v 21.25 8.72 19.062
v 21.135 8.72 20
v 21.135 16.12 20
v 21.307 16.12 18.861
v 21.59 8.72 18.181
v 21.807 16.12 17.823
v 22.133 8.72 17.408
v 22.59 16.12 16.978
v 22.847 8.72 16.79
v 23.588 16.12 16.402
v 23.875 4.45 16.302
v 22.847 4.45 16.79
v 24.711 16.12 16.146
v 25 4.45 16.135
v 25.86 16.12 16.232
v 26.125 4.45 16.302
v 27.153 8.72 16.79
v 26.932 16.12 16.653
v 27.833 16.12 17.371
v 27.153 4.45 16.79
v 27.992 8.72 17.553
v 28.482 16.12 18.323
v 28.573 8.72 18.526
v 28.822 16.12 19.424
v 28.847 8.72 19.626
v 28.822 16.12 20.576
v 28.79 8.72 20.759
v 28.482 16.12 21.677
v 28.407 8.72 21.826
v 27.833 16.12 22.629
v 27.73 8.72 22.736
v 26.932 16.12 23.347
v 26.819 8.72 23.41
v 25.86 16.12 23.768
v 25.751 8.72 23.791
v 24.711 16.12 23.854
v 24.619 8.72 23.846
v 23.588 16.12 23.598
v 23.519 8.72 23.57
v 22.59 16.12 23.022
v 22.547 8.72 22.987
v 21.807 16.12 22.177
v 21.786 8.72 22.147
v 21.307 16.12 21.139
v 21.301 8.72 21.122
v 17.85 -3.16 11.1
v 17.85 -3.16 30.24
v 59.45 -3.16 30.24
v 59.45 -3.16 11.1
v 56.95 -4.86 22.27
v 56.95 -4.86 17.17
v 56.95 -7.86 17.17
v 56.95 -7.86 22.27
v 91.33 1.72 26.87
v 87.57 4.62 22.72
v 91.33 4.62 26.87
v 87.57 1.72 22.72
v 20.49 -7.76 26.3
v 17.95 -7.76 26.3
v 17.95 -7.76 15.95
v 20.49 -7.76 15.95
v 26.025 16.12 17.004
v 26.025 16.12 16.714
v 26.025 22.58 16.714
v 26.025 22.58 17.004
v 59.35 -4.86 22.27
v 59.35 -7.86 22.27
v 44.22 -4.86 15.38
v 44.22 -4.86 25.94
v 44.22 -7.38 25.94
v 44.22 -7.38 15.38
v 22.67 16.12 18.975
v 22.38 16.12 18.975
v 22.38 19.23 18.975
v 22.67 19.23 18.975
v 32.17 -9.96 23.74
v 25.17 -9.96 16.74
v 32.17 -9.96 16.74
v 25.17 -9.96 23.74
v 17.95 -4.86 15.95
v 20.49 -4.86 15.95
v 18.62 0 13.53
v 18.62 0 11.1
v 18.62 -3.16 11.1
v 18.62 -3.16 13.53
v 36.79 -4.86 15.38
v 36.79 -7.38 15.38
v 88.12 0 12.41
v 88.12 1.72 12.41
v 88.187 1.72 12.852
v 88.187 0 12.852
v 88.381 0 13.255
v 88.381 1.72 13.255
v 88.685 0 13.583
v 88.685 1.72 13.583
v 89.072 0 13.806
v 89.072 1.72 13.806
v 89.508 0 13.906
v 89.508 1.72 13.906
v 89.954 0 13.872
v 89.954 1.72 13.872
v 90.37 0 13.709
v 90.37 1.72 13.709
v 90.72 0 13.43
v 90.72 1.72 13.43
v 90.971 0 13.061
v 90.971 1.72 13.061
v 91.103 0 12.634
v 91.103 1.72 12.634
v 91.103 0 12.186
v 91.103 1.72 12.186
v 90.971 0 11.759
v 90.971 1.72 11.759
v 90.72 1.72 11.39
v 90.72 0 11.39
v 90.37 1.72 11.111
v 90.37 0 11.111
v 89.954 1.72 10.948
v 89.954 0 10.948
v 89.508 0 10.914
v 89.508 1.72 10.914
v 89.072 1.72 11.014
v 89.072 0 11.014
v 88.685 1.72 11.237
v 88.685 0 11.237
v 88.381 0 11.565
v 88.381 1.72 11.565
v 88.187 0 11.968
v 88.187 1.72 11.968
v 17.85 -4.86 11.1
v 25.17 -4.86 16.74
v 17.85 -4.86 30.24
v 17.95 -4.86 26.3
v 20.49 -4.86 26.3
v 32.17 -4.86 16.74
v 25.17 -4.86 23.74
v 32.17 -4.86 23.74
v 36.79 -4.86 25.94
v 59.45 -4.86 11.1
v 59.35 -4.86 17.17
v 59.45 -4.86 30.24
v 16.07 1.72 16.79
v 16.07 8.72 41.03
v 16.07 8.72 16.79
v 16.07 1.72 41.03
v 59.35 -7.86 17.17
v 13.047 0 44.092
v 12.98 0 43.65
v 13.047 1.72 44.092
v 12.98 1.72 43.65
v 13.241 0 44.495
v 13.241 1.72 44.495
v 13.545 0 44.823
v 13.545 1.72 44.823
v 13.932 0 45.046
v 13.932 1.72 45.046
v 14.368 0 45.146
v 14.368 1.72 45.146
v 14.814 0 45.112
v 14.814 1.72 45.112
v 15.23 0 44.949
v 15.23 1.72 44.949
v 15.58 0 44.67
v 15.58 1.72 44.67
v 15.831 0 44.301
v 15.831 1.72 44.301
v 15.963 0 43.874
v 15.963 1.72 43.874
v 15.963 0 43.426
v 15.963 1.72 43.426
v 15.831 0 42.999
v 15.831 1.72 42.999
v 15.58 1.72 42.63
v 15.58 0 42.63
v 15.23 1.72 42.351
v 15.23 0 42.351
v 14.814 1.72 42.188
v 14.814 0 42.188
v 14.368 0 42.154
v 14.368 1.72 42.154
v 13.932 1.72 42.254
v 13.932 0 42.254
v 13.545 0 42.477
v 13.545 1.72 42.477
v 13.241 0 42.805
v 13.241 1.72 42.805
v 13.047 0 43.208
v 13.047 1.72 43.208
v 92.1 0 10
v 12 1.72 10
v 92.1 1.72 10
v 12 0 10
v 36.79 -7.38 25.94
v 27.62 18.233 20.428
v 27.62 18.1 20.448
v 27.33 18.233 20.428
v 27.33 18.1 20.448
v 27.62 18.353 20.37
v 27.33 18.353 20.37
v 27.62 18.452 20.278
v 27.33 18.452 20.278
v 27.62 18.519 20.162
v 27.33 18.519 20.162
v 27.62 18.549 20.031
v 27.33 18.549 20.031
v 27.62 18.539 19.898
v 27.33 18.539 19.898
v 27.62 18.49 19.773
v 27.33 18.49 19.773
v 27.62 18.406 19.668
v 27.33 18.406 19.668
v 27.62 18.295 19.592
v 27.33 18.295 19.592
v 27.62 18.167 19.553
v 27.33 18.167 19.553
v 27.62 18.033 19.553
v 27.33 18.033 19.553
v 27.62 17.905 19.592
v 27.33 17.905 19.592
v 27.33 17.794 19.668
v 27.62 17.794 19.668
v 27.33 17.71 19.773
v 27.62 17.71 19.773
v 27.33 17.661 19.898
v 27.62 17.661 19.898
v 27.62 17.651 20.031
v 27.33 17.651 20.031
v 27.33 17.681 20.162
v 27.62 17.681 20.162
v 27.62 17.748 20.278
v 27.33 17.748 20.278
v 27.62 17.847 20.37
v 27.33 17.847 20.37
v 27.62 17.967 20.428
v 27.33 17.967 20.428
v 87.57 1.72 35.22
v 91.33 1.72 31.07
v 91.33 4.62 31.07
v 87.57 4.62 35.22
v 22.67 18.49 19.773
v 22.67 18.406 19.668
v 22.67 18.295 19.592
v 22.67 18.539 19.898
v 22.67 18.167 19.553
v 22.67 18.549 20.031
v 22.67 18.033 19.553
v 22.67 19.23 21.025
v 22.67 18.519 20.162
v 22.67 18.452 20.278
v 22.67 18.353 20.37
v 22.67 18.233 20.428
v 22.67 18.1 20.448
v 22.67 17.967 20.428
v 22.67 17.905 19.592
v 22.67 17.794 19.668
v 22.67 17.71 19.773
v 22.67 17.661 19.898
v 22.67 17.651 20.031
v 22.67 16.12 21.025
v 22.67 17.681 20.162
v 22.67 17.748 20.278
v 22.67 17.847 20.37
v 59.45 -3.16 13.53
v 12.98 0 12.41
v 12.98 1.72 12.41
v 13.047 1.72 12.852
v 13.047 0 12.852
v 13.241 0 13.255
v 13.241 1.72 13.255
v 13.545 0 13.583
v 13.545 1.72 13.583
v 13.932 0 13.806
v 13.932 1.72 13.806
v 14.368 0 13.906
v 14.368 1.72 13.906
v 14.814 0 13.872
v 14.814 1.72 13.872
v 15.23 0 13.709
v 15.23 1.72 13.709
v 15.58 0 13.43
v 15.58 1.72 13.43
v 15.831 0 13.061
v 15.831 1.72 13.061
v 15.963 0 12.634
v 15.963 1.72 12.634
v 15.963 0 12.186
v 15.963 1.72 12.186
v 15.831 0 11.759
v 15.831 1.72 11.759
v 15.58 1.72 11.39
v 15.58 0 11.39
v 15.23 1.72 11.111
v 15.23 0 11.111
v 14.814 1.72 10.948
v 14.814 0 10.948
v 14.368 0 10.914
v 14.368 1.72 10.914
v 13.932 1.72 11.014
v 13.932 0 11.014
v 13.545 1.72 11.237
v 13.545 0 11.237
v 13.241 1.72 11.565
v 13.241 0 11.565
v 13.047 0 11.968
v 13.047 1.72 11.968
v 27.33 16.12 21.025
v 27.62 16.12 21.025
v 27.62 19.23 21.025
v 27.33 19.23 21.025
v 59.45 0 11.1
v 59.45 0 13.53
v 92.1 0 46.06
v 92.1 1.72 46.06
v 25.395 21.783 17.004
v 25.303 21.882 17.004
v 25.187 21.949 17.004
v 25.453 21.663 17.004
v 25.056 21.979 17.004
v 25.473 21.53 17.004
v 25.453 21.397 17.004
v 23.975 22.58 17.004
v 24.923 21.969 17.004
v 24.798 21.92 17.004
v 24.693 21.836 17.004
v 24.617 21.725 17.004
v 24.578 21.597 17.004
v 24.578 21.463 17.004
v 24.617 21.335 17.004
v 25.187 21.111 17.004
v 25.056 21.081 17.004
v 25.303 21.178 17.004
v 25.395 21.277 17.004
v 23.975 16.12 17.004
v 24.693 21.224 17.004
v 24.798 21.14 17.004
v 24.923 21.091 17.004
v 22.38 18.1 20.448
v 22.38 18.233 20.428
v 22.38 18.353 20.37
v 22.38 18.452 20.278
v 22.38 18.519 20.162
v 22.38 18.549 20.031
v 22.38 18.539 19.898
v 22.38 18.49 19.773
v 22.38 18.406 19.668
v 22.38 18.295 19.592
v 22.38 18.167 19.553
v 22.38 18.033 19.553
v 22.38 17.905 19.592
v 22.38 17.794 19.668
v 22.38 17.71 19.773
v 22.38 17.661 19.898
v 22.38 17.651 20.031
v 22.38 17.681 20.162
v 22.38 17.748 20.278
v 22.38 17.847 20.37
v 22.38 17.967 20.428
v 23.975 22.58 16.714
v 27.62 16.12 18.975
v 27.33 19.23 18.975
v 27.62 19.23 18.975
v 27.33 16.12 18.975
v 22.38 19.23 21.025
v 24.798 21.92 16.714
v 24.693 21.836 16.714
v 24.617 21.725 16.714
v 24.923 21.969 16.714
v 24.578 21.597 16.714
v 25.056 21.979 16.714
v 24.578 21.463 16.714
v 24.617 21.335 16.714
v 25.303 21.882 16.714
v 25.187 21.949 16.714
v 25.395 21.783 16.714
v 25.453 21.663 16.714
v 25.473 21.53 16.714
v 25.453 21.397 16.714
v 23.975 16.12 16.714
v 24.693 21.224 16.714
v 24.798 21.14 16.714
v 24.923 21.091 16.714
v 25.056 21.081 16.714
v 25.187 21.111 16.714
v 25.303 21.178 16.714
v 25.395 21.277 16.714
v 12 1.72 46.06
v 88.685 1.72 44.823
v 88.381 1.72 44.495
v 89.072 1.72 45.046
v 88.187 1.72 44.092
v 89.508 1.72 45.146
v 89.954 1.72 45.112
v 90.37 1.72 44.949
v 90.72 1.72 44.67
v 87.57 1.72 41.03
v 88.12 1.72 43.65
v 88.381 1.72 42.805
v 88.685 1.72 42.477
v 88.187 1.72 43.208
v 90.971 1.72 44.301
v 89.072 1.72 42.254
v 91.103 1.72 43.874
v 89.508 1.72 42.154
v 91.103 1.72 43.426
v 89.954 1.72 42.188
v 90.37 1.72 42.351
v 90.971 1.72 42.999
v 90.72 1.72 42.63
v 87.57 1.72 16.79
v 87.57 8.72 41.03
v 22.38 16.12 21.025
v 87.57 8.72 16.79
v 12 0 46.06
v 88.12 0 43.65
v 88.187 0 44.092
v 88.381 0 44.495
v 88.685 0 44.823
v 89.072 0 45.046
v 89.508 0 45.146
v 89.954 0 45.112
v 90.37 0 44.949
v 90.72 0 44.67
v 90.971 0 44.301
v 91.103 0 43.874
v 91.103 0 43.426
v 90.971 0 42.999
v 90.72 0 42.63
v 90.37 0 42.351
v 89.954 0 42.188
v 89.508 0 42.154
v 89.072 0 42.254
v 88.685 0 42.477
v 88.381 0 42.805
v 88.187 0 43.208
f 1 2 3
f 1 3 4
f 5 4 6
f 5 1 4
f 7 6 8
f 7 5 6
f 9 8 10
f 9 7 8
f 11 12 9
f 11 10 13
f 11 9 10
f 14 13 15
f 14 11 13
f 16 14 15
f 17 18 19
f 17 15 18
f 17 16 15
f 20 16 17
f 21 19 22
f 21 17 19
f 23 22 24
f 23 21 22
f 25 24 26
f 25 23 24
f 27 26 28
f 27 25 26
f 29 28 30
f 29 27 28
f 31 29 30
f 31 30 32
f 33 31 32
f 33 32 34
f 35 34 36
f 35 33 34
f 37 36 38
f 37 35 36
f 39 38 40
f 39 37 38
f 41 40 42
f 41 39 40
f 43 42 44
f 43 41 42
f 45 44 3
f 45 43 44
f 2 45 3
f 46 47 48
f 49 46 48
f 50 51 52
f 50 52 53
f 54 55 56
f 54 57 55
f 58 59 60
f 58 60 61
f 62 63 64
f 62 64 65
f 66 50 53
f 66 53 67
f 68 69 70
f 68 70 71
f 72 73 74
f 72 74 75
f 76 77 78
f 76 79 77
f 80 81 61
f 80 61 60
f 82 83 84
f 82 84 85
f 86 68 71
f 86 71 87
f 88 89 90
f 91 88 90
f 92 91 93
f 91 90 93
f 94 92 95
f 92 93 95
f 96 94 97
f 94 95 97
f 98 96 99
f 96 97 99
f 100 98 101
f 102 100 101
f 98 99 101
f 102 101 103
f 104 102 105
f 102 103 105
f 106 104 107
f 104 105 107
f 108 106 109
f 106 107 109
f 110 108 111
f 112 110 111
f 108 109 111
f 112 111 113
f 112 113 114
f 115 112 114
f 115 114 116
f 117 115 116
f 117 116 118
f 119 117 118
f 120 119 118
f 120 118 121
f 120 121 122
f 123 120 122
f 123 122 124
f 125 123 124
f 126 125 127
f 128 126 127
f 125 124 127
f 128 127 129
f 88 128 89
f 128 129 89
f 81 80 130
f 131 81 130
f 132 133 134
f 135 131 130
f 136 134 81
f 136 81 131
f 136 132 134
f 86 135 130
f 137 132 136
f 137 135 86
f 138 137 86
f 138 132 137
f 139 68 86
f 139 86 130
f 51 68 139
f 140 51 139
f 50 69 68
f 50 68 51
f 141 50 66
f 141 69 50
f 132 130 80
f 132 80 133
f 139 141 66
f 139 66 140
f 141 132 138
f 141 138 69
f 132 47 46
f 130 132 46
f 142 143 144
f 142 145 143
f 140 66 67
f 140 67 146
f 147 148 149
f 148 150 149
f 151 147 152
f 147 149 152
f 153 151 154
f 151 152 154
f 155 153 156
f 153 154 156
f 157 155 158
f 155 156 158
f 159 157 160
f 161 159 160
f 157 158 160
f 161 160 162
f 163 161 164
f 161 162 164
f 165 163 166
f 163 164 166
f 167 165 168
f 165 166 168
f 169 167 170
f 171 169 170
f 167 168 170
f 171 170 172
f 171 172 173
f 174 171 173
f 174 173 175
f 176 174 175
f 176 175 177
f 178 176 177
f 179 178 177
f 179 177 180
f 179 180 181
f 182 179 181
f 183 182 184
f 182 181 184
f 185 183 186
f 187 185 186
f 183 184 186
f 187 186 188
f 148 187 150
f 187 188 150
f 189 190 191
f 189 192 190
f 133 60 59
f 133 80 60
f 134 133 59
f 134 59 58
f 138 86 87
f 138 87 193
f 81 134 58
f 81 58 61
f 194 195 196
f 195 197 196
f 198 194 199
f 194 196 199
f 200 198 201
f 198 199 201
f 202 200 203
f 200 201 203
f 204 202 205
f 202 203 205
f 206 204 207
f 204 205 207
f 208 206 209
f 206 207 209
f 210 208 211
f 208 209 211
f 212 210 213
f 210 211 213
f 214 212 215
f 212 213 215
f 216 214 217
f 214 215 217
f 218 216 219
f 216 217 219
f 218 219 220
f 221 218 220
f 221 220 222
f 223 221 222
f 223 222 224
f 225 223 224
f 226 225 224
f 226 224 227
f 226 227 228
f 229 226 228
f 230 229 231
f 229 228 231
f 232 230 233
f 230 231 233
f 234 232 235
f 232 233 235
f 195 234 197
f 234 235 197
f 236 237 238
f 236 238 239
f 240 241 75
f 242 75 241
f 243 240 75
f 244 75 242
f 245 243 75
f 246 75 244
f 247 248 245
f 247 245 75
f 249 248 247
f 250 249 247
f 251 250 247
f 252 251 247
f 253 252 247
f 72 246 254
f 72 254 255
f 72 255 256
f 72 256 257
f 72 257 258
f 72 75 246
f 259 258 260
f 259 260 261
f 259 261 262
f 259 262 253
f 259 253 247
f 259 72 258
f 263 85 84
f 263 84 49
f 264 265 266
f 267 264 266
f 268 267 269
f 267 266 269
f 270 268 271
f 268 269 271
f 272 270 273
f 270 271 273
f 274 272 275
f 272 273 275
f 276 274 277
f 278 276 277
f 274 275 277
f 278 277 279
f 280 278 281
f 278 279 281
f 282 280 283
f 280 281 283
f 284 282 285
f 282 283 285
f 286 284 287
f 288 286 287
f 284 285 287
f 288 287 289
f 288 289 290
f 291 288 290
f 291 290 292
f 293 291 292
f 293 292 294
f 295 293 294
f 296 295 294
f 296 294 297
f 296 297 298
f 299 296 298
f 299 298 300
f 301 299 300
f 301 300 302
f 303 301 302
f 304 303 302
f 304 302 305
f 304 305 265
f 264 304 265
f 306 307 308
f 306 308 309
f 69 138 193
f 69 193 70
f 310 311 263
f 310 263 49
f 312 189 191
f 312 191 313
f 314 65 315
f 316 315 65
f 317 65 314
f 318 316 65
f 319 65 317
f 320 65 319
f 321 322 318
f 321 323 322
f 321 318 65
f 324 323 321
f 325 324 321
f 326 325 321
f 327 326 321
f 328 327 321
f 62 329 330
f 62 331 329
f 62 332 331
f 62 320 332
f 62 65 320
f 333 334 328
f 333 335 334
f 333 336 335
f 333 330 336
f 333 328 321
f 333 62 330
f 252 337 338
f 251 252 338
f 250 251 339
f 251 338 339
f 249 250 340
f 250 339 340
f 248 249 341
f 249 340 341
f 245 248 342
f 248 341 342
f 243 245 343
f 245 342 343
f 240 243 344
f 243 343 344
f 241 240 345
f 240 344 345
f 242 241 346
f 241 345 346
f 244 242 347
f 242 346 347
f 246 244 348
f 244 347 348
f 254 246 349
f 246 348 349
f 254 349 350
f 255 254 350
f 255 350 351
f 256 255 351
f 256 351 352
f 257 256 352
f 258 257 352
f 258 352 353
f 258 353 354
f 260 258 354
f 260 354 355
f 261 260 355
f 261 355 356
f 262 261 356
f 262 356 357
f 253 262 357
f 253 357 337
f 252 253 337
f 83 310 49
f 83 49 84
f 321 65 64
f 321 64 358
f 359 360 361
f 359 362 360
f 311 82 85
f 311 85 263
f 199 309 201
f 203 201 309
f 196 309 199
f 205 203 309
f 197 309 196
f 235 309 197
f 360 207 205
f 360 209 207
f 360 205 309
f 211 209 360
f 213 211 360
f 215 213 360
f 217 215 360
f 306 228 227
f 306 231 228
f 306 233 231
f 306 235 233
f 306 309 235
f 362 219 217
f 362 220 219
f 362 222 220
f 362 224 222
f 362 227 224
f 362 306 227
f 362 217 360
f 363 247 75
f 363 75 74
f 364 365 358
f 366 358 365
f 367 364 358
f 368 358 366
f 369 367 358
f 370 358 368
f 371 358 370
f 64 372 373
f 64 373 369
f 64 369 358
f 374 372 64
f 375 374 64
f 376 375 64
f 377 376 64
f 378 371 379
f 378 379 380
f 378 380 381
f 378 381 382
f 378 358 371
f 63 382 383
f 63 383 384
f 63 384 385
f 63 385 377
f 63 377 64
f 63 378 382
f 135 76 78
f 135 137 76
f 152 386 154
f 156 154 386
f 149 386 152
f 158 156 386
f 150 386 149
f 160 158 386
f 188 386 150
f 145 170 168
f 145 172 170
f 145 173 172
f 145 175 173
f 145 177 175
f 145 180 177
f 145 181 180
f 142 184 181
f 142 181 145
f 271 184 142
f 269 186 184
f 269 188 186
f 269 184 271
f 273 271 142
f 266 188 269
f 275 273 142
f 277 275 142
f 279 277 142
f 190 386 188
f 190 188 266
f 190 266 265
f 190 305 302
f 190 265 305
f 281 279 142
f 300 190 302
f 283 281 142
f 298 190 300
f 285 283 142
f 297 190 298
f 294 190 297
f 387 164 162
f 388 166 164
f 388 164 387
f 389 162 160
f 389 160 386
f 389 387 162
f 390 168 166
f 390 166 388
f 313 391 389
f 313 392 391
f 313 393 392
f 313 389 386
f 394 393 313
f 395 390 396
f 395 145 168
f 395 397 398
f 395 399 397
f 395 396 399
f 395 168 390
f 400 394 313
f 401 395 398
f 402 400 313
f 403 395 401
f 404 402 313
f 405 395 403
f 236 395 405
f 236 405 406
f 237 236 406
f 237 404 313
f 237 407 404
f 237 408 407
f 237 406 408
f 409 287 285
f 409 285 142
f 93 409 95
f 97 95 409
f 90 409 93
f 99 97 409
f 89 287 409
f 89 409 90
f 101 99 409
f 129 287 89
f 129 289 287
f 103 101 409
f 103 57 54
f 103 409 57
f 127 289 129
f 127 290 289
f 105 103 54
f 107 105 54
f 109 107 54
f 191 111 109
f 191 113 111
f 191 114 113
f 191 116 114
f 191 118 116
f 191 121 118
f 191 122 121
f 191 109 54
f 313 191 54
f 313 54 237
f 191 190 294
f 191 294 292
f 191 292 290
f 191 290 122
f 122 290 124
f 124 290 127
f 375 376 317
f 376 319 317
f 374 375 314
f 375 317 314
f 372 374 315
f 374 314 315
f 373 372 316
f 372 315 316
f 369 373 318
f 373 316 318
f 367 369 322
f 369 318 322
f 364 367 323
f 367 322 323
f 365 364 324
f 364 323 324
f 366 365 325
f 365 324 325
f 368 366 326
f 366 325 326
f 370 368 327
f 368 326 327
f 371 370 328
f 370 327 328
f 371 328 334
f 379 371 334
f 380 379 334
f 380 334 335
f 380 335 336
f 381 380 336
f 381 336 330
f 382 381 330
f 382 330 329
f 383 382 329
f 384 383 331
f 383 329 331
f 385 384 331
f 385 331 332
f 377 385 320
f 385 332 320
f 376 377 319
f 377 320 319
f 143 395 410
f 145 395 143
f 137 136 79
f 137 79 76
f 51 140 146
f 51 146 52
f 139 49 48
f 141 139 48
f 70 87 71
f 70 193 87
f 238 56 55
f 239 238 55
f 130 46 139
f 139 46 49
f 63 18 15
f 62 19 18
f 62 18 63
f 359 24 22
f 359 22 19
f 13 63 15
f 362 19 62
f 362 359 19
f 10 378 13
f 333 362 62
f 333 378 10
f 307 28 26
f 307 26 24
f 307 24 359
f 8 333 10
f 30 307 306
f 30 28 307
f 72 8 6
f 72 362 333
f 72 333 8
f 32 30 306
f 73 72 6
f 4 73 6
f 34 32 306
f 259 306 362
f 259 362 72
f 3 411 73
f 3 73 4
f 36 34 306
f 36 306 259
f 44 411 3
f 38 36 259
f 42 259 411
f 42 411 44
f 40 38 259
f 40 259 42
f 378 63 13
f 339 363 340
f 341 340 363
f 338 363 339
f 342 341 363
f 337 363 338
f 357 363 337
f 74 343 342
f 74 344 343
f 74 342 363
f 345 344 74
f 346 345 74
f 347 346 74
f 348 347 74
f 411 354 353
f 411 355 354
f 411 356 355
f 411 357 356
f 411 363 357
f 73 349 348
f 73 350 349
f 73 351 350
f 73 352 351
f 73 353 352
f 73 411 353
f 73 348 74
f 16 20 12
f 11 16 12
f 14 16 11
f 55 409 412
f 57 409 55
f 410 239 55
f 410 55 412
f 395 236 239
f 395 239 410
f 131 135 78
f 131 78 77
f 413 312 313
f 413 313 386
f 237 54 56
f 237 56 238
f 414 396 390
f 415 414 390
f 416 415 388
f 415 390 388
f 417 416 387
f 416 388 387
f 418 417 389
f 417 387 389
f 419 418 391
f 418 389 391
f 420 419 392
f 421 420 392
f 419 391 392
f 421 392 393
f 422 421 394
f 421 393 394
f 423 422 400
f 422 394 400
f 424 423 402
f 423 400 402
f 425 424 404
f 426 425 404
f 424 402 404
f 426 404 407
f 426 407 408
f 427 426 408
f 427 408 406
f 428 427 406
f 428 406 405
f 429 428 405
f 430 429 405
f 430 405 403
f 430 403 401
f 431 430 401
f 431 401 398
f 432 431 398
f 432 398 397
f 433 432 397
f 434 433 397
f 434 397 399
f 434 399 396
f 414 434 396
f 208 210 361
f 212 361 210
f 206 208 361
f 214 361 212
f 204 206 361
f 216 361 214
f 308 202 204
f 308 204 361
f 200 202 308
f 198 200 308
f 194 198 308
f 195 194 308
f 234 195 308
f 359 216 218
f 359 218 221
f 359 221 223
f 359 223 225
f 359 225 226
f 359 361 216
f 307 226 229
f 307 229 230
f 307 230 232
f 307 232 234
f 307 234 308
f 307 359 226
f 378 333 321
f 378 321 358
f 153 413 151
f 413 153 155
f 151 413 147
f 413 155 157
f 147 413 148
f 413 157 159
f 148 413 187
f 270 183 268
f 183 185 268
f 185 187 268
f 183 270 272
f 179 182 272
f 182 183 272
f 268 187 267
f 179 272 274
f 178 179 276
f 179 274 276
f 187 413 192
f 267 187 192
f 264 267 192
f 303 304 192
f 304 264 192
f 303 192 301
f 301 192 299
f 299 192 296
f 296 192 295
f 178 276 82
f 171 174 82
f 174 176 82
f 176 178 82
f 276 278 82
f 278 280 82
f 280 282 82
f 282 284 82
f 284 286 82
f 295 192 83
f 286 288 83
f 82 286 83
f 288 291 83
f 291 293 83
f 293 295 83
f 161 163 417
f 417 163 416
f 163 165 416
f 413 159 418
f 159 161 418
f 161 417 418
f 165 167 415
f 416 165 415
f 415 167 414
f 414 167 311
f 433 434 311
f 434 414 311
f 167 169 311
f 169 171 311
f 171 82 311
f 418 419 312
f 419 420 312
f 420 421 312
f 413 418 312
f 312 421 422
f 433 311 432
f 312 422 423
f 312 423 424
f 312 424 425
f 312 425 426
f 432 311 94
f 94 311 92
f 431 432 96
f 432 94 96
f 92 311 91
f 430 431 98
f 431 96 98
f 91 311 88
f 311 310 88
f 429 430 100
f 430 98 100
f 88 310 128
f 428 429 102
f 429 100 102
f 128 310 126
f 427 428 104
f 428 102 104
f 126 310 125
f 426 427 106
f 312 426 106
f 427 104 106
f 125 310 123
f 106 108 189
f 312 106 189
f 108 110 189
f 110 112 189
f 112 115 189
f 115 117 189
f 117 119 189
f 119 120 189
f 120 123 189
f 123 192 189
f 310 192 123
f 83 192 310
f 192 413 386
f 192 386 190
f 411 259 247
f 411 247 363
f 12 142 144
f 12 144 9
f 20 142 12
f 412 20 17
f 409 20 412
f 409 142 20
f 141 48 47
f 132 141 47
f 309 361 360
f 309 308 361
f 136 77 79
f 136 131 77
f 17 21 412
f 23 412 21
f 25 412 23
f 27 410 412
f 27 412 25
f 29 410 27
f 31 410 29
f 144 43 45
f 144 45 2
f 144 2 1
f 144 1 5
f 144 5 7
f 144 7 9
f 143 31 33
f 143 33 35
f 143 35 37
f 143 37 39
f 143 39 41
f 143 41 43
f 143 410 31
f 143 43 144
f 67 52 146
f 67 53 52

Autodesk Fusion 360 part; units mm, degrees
sketch "Main PCB" plane through (0, 0, 0) normal (0, 1, 0) x (1, 0, 0)
  line L0 (12, -10) -> (92.1, -10)
  line L1 (92.1, -10) -> (92.1, -46.06)
  line L2 (92.1, -46.06) -> (12, -46.06)
  line L3 (12, -46.06) -> (12, -10)
  dimension "d1" = 80.1
  dimension "d2" = 36.06
extrude "Extrude1" add sketch "Main PCB" along normal blind 1.72 makes body 1
sketch "Display unit" plane through (0, 1.72, 0) normal (0, 1, 0) x (-1, 0, 0)
  line L0 (-12, 46.06) -> (-92.1, 46.06)
  line L1 (-92.1, 46.06) -> (-92.1, 10)
  line L2 (-92.1, 10) -> (-12, 10)
  line L3 (-12, 10) -> (-12, 46.06)
  line L4 (-16.07, 16.79) -> (-87.57, 16.79)
  line L5 (-87.57, 16.79) -> (-87.57, 41.03)
  line L6 (-87.57, 41.03) -> (-16.07, 41.03)
  line L7 (-16.07, 41.03) -> (-16.07, 16.79)
  dimension "d5" = 71.5
  dimension "d6" = 24.24
  dimension "d7" = 5.03
  dimension "d8" = 4.07
extrude "Extrude2" add sketch "Display unit" along normal blind 7 contours L4 L5 L6 L7 bodies 1
sketch "Trapezium display unit" plane through (0, 1.72, 0) normal (0, 1, 0) x (-1, 0, 0)
  line L0 (-16.07, 41.03) -> (-16.07, 16.79)
  line L1 (-16.07, 16.79) -> (-87.57, 16.79)
  line L2 (-87.57, 16.79) -> (-87.57, 41.03)
  line L3 (-87.57, 41.03) -> (-16.07, 41.03)
  line L4 (-12, 46.06) -> (-92.1, 46.06)
  line L5 (-92.1, 46.06) -> (-92.1, 10)
  line L6 (-92.1, 10) -> (-12, 10)
  line L7 (-12, 10) -> (-12, 46.06)
  line L8 (-87.57, 22.72) -> (-91.33, 26.87)
  line L9 (-91.33, 26.87) -> (-91.33, 31.07)
  line L10 (-91.33, 31.07) -> (-87.57, 35.22)
  line L11 (-87.57, 22.72) -> (-87.57, 35.22)
  dimension "d11" = 12.5
  dimension "d12" = 4.2
  dimension "d13" = 5.6
  dimension "d16" = 5.93
extrude "Extrude3" add sketch "Trapezium display unit" along normal blind 2.9 contours L2 L8 L9 L10 L11 bodies 1
sketch "PCB holes" plane through (0, 1.72, 0) normal (0, 1, 0) x (-1, 0, 0)
  line L0 (-12, 46.06) -> (-92.1, 46.06)
  line L1 (-92.1, 46.06) -> (-92.1, 10)
  line L2 (-92.1, 10) -> (-12, 10)
  line L3 (-12, 10) -> (-12, 46.06)
  line L4 (-87.57, 22.72) -> (-91.33, 26.87)
  line L5 (-91.33, 26.87) -> (-91.33, 31.07)
  line L6 (-91.33, 31.07) -> (-87.57, 35.22)
  line L7 (-87.57, 35.22) -> (-87.57, 41.03)
  line L8 (-87.57, 41.03) -> (-16.07, 41.03)
  line L9 (-16.07, 41.03) -> (-16.07, 16.79)
  line L10 (-16.07, 16.79) -> (-87.57, 16.79)
  line L11 (-87.57, 16.79) -> (-87.57, 22.72)
  circle A0 centre (-14.48, 12.41) radius 1.5
  circle A1 centre (-89.62, 12.41) radius 1.5
  circle A2 centre (-89.62, 43.65) radius 1.5
  circle A3 centre (-14.48, 43.65) radius 1.5
  dimension "d17" = 3
  dimension "d18" = 2.41
  dimension "d19" = 2.48
  dimension "d20" = 3
  dimension "d21" = 2.41
  dimension "d22" = 2.48
  dimension "d23" = 3
  dimension "d24" = 3
  dimension "d25" = 2.48
  dimension "d26" = 2.41
  dimension "d27" = 2.48
  dimension "d28" = 2.41
extrude "Extrude4" cut sketch "PCB holes" against normal up to surface (1.72 mm away) contours A0 | A1 | A2 | A3 bodies 1
sketch "PINs back" plane through (0, 0, 0) normal (0, -1, 0) x (1, 0, 0)
  circle A0 centre (14.48, 43.65) radius 1.5
  circle A1 centre (89.62, 43.65) radius 1.5
  circle A2 centre (14.48, 12.41) radius 1.5
  circle A3 centre (89.62, 12.41) radius 1.5
  line L0 (92.1, 46.06) -> (12, 46.06)
  line L1 (12, 46.06) -> (12, 10)
  line L2 (12, 10) -> (92.1, 10)
  line L3 (92.1, 10) -> (92.1, 46.06)
  line L4 (18.62, 13.53) -> (59.45, 13.53)
  line L5 (59.45, 13.53) -> (59.45, 11.1)
  line L6 (59.45, 11.1) -> (18.62, 11.1)
  line L7 (18.62, 11.1) -> (18.62, 13.53)
  dimension "d31" = 40.83
  dimension "d32" = 2.43
  dimension "d33" = 1.1
  dimension "d34" = 6.62
extrude "Extrude5" add sketch "PINs back" along normal blind 3.16 contours L4 L5 L6 L7 bodies 1
sketch "PCB driver" plane through (0, -3.16, 0) normal (0, -1, 0) x (1, 0, 0)
  line L0 (18.62, 11.1) -> (59.45, 11.1)
  line L1 (59.45, 11.1) -> (59.45, 13.53)
  line L2 (59.45, 13.53) -> (18.62, 13.53)
  line L3 (18.62, 13.53) -> (18.62, 11.1)
  line L4 (17.85, 11.1) -> (59.45, 11.1)
  line L5 (59.45, 11.1) -> (59.45, 30.24)
  line L6 (59.45, 30.24) -> (17.85, 30.24)
  line L7 (17.85, 30.24) -> (17.85, 11.1)
  dimension "d37" = 41.6
  dimension "d38" = 19.14
extrude "Extrude6" add sketch "PCB driver" along normal blind 1.7 separate body makes body 2
sketch "PCB driver components" plane through (0, -4.86, 0) normal (0, -1, 0) x (1, 0, 0)
  line L0 (17.85, 30.24) -> (17.85, 11.1)
  line L1 (17.85, 11.1) -> (59.45, 11.1)
  line L2 (59.45, 11.1) -> (59.45, 30.24)
  line L3 (59.45, 30.24) -> (17.85, 30.24)
  line L4 (25.17, 23.74) -> (32.17, 23.74)
  line L5 (32.17, 23.74) -> (32.17, 16.74)
  line L6 (32.17, 16.74) -> (25.17, 16.74)
  line L7 (25.17, 16.74) -> (25.17, 23.74)
  line L8 (17.95, 26.3) -> (20.49, 26.3)
  line L9 (20.49, 26.3) -> (20.49, 15.95)
  line L10 (20.49, 15.95) -> (17.95, 15.95)
  line L11 (17.95, 15.95) -> (17.95, 26.3)
  line L12 (56.95, 22.27) -> (59.35, 22.27)
  line L13 (59.35, 22.27) -> (59.35, 17.17)
  line L14 (59.35, 17.17) -> (56.95, 17.17)
  line L15 (56.95, 17.17) -> (56.95, 22.27)
  line L16 (36.79, 25.94) -> (44.22, 25.94)
  line L17 (44.22, 25.94) -> (44.22, 15.38)
  line L18 (44.22, 15.38) -> (36.79, 15.38)
  line L19 (36.79, 15.38) -> (36.79, 25.94)
  dimension "d42" = 7
  dimension "d43" = 7
  dimension "d45" = 6.5
  dimension "d46" = 27.28
  dimension "d49" = 2.54
  dimension "d50" = 10.35
  dimension "d51" = 3.94
  dimension "d52" = 0.1
  dimension "d55" = 5.1
  dimension "d56" = 2.4
  dimension "d57" = 7.97
  dimension "d58" = 0.1
  dimension "d61" = 7.43
  dimension "d63" = 10.56
  dimension "d64" = 4.3
  dimension "d65" = 4.62
extrude "Extrude10" add sketch "PCB driver components" along normal blind 2.52 contours L16 L17 L18 L19 bodies 2
extrude "Extrude9" add sketch "PCB driver components" along normal blind 3 contours L12 L13 L14 L15 bodies 2
extrude "Extrude8" add sketch "PCB driver components" along normal blind 2.9 contours L8 L9 L10 L11 bodies 2
extrude "Extrude7" add sketch "PCB driver components" along normal blind 5.1 contours L4 L5 L6 L7 bodies 2
equation "d18 = 0.91 mm + d17 / 2"
equation "d19 = 0.98 mm + d17 / 2"
equation "d20 = d17"
equation "d21 = d18"
equation "d22 = d19"
equation "d23 = d17"
equation "d24 = d17"
equation "d25 = d19"
equation "d26 = d18"
equation "d27 = d19"
equation "d28 = d18"

Autodesk Fusion 360 part; units mm, degrees
sketch "Jack base" plane through (0, 0, 0) normal (0, 1, 0) x (1, 0, 0)
  circle A0 centre (25, -20) radius 1.77
  circle A1 centre (25, -20) radius 2.885
  dimension "d1" = 5.77
  dimension "d2" = 3.54
extrude "Extrude1" add sketch "Jack base" along normal blind 4.45
sketch "Housing" plane through (0, 4.45, 0) normal (0, 1, 0) x (-1, 0, 0)
  circle A0 centre (-25, 20) radius 1.77
  circle A1 centre (-25, 20) radius 2.885
  circle A2 centre (-25, 20) radius 3.865
  dimension "d5" = 7.73
extrude "Extrude2" add sketch "Housing" along normal blind 11.67 contours A0 | A1 | A2
thread "Thread1"
sketch "Pins" plane through (0, 16.12, 0) normal (0, 1, 0) x (-1, 0, 0)
  circle A0 centre (-25, 20) radius 3.865
  line L0 (-18.2729, 16.135) -> (-31.9251, 16.135) construction
  line L1 (-26.025, 17.0035) -> (-23.975, 17.0035)
  line L2 (-23.975, 17.0035) -> (-23.975, 16.7135)
  line L3 (-23.975, 16.7135) -> (-26.025, 16.7135)
  line L4 (-26.025, 16.7135) -> (-26.025, 17.0035)
  line L5 (-26.025, 17.0035) -> (-23.975, 16.7135) construction
  line L6 (-23.975, 17.0035) -> (-26.025, 16.7135) construction
  line L7 (-25, 24.5533) -> (-25, 15.4467) construction
  line L8 (-18.8718, 20) -> (-31.1282, 20) construction
  line L9 (-27.62, 21.025) -> (-27.33, 21.025)
  line L10 (-27.33, 21.025) -> (-27.33, 18.975)
  line L11 (-27.33, 18.975) -> (-27.62, 18.975)
  line L12 (-27.62, 18.975) -> (-27.62, 21.025)
  line L13 (-27.62, 21.025) -> (-27.33, 18.975) construction
  line L14 (-27.33, 21.025) -> (-27.62, 18.975) construction
  line L15 (-22.67, 21.025) -> (-22.38, 21.025)
  line L16 (-22.38, 21.025) -> (-22.38, 18.975)
  line L17 (-22.38, 18.975) -> (-22.67, 18.975)
  line L18 (-22.67, 18.975) -> (-22.67, 21.025)
  line L19 (-22.67, 21.025) -> (-22.38, 18.975) construction
  line L20 (-22.38, 21.025) -> (-22.67, 18.975) construction
  dimension "d16" = 2.05
  dimension "d17" = 0.29
  dimension "d18" = 0.29
  dimension "d19" = 0.29
  dimension "d20" = 2.05
  dimension "d21" = 2.05
  dimension "d24" = 2.33
  dimension "d25" = 2.33
extrude "Extrude3" add sketch "Pins" along normal blind 6.46 contours L1 L2 L3 L4
extrude "Extrude4" add sketch "Pins" along normal blind 3.11 contours L9 L10 L11 L12 | L15 L16 L17 L18
sketch "Holes in small pins" plane through (22.38, 0, 0) normal (-1, 0, 0) x (0, 0, 1)
  line L0 (18.975, 16.12) -> (21.025, 16.12)
  line L1 (21.025, 16.12) -> (21.025, 19.23)
  line L2 (21.025, 19.23) -> (18.975, 19.23)
  line L3 (18.975, 19.23) -> (18.975, 16.12)
  circle A0 centre (19.9977, 18.1) radius 0.45
  line L4 (18, 18.55) -> (23, 18.55) construction
  dimension "d30" = 0.9
  dimension "d32" = 0.68
extrude "Extrude5" cut sketch "Holes in small pins" against normal up to surface (5.24 mm away) contours A0
sketch "Hole in big pin" plane through (0, 0, 17.0035) normal (0, 0, 1) x (1, 0, 0)
  line L0 (23.975, 16.12) -> (26.025, 16.12)
  line L1 (26.025, 16.12) -> (26.025, 22.58)
  line L2 (26.025, 22.58) -> (23.975, 22.58)
  line L3 (23.975, 22.58) -> (23.975, 16.12)
  circle A0 centre (25.0227, 21.53) radius 0.45
  line L4 (21, 21.98) -> (31, 21.98) construction
  dimension "d35" = 0.9
  dimension "d36" = 0.6
extrude "Extrude6" cut sketch "Hole in big pin" against normal up to surface (0.29 mm away) contours A0
equation "d18 = d17"
equation "d19 = d17"
equation "d20 = d16"
equation "d21 = d16"
